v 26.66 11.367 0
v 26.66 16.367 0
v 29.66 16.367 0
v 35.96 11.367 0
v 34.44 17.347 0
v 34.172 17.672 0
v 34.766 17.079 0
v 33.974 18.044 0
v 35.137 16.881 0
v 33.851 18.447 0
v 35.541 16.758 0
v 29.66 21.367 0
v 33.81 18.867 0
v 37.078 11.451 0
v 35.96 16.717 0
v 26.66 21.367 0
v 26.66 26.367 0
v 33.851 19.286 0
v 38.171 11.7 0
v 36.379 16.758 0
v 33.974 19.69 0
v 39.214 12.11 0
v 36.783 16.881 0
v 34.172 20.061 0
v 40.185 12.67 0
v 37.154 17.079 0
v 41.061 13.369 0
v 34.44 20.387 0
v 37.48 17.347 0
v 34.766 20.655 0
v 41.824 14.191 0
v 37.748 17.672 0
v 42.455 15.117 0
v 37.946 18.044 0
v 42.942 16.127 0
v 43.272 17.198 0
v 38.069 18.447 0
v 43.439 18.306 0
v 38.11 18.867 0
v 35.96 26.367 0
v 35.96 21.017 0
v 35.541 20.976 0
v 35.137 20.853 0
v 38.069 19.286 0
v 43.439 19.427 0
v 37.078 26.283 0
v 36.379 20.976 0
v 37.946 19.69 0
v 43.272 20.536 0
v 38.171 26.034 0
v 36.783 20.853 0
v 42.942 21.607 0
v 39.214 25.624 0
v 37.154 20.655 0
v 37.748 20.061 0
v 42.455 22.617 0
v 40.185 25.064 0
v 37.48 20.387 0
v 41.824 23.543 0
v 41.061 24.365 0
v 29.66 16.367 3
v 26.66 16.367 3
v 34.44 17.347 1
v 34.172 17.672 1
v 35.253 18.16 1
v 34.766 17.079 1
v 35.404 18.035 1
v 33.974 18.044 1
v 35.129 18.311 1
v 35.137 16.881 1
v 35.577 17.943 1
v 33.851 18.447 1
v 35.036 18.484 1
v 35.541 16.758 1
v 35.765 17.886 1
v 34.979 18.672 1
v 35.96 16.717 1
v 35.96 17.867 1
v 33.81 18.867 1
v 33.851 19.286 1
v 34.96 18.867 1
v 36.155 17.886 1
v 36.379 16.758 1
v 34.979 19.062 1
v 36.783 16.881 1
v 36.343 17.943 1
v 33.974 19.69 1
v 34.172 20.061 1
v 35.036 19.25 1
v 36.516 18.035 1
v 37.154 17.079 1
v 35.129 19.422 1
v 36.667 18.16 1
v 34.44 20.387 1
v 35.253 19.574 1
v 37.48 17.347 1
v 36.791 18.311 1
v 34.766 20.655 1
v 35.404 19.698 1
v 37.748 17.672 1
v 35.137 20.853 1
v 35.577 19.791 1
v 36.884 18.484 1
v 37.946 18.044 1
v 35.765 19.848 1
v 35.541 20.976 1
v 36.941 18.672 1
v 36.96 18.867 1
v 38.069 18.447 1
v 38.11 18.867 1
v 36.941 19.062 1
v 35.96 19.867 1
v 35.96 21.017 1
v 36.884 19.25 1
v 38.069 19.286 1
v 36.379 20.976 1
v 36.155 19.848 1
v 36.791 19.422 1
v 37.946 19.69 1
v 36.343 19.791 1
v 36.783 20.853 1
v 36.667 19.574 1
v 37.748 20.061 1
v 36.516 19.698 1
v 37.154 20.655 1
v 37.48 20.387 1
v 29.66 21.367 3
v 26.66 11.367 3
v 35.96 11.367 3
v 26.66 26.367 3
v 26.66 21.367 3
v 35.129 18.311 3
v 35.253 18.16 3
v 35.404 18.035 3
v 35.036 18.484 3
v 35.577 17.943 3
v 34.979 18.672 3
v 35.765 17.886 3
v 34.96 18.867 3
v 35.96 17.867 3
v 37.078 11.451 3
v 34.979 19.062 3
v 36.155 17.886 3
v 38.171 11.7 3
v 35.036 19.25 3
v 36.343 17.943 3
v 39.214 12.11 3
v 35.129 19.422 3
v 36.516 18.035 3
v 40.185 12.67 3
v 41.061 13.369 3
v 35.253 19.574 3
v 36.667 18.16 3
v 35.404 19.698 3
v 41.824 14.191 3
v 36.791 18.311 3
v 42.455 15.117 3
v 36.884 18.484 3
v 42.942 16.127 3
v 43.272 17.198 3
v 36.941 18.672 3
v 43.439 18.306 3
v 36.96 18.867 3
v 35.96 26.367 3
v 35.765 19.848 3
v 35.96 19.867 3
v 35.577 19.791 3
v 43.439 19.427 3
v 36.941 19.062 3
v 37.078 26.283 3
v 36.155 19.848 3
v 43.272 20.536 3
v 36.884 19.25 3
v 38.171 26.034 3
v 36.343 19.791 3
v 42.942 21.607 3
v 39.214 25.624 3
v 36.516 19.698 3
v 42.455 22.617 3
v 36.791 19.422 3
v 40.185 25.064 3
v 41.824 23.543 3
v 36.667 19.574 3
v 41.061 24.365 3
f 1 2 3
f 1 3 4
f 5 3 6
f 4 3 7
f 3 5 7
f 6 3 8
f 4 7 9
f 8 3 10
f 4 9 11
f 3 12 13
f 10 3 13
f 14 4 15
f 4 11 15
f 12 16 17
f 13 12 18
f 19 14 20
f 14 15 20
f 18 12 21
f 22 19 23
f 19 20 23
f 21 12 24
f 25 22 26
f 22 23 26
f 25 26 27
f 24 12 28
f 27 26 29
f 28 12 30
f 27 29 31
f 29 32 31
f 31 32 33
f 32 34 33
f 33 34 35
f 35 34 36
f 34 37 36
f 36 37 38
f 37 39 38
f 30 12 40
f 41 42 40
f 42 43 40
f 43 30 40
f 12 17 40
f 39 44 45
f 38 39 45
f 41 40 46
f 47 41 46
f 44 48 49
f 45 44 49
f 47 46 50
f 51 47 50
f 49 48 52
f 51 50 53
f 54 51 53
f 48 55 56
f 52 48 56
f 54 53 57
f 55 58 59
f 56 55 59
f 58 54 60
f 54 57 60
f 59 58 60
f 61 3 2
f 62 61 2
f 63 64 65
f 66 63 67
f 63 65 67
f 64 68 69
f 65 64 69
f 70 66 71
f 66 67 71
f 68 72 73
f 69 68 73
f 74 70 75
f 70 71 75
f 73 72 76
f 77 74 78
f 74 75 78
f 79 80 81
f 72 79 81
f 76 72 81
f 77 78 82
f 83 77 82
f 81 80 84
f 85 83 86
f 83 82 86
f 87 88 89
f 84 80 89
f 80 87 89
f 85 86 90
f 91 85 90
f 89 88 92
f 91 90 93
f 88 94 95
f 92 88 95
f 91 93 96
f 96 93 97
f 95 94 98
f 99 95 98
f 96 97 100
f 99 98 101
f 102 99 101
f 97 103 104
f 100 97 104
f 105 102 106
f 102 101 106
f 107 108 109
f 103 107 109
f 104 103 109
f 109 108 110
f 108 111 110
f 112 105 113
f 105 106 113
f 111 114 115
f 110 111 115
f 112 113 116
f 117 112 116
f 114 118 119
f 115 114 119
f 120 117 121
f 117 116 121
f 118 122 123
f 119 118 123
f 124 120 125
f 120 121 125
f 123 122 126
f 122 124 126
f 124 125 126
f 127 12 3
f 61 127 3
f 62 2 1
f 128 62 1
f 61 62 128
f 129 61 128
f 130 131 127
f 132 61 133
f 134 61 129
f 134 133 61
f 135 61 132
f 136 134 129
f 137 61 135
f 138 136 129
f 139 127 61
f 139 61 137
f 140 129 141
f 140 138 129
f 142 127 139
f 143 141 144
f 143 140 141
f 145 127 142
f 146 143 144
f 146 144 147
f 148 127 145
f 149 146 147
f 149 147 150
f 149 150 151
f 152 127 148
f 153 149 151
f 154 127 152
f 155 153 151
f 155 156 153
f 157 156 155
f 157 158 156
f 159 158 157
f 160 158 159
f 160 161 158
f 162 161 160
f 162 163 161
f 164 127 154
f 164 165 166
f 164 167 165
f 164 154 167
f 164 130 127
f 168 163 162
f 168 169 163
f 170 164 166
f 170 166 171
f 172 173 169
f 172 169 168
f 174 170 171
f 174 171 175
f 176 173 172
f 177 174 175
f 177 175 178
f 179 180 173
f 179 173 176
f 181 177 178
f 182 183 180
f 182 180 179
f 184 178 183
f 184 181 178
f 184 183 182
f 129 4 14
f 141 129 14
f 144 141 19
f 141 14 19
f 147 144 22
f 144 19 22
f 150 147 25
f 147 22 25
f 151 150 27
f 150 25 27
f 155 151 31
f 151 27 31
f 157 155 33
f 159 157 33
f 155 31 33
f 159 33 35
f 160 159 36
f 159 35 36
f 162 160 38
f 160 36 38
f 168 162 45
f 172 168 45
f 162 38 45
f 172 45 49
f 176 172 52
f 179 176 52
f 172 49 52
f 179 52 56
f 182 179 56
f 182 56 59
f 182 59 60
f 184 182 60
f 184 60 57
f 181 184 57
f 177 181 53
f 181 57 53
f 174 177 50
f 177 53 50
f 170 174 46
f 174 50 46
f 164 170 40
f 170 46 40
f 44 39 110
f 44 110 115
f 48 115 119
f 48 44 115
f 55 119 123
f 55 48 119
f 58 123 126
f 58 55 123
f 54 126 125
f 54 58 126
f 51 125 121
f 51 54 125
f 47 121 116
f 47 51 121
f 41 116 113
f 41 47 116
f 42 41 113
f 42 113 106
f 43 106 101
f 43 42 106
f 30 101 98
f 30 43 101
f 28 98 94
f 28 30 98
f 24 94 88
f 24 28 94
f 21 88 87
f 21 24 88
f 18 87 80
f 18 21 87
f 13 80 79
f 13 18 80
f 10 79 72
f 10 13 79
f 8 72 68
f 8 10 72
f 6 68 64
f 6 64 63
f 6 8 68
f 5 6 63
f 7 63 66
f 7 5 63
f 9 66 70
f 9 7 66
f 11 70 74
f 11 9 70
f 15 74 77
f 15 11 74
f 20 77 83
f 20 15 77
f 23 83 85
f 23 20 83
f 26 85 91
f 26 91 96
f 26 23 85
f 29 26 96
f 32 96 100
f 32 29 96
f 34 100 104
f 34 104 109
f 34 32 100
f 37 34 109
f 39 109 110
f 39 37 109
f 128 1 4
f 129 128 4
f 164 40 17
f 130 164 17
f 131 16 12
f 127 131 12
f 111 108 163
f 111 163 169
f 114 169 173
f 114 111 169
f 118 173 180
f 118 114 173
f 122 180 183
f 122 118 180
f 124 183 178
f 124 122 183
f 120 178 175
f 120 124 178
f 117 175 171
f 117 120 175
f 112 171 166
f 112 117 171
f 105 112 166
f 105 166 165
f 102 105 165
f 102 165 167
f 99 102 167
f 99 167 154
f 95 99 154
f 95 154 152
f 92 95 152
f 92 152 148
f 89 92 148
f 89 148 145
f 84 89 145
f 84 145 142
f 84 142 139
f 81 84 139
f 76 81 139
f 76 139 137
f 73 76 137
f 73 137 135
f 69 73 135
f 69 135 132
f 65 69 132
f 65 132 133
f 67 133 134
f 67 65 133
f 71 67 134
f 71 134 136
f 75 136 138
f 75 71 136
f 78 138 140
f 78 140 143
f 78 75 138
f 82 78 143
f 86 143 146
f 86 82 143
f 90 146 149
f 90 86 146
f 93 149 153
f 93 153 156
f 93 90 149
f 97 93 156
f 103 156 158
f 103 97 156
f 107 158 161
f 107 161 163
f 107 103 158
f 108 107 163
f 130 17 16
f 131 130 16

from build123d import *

# Parameters (mm, degrees)
MODEL_R                 = 1
SALIENTE_EXTRUIR1_DEPTH = 3
CROQUIS2_R              = 2.15
CORTAR_EXTRUIR1_DEPTH   = 1


with BuildPart() as part:
    # Model → Saliente-Extruir1 (new body)
    with BuildSketch(Plane.XY):
        with BuildLine():
            Line((26.66, 16.366878764), (26.66, 11.366878764))
            Line((26.66, 11.366878764), (35.96, 11.366878764))
            ThreePointArc((35.96, 11.366878764), (43.46, 18.866878764), (35.96, 26.366878764))
            Line((35.96, 26.366878764), (26.66, 26.366878764))
            Line((26.66, 26.366878764), (26.66, 21.366878764))
            Line((26.66, 21.366878764), (29.66, 21.366878764))
            Line((29.66, 21.366878764), (29.66, 16.366878764))
            Line((29.66, 16.366878764), (26.66, 16.366878764))
        make_face()
        with Locations((35.96, 18.866878764)):
            Circle(MODEL_R, mode=Mode.SUBTRACT)
    extrude(amount=SALIENTE_EXTRUIR1_DEPTH)

    # Croquis2 → Cortar-Extruir1 (cut)
    with BuildSketch(Plane.XY):
        with Locations((35.96, 18.866878764)):
            Circle(CROQUIS2_R)
    extrude(amount=CORTAR_EXTRUIR1_DEPTH, mode=Mode.SUBTRACT)


solid = part.part
